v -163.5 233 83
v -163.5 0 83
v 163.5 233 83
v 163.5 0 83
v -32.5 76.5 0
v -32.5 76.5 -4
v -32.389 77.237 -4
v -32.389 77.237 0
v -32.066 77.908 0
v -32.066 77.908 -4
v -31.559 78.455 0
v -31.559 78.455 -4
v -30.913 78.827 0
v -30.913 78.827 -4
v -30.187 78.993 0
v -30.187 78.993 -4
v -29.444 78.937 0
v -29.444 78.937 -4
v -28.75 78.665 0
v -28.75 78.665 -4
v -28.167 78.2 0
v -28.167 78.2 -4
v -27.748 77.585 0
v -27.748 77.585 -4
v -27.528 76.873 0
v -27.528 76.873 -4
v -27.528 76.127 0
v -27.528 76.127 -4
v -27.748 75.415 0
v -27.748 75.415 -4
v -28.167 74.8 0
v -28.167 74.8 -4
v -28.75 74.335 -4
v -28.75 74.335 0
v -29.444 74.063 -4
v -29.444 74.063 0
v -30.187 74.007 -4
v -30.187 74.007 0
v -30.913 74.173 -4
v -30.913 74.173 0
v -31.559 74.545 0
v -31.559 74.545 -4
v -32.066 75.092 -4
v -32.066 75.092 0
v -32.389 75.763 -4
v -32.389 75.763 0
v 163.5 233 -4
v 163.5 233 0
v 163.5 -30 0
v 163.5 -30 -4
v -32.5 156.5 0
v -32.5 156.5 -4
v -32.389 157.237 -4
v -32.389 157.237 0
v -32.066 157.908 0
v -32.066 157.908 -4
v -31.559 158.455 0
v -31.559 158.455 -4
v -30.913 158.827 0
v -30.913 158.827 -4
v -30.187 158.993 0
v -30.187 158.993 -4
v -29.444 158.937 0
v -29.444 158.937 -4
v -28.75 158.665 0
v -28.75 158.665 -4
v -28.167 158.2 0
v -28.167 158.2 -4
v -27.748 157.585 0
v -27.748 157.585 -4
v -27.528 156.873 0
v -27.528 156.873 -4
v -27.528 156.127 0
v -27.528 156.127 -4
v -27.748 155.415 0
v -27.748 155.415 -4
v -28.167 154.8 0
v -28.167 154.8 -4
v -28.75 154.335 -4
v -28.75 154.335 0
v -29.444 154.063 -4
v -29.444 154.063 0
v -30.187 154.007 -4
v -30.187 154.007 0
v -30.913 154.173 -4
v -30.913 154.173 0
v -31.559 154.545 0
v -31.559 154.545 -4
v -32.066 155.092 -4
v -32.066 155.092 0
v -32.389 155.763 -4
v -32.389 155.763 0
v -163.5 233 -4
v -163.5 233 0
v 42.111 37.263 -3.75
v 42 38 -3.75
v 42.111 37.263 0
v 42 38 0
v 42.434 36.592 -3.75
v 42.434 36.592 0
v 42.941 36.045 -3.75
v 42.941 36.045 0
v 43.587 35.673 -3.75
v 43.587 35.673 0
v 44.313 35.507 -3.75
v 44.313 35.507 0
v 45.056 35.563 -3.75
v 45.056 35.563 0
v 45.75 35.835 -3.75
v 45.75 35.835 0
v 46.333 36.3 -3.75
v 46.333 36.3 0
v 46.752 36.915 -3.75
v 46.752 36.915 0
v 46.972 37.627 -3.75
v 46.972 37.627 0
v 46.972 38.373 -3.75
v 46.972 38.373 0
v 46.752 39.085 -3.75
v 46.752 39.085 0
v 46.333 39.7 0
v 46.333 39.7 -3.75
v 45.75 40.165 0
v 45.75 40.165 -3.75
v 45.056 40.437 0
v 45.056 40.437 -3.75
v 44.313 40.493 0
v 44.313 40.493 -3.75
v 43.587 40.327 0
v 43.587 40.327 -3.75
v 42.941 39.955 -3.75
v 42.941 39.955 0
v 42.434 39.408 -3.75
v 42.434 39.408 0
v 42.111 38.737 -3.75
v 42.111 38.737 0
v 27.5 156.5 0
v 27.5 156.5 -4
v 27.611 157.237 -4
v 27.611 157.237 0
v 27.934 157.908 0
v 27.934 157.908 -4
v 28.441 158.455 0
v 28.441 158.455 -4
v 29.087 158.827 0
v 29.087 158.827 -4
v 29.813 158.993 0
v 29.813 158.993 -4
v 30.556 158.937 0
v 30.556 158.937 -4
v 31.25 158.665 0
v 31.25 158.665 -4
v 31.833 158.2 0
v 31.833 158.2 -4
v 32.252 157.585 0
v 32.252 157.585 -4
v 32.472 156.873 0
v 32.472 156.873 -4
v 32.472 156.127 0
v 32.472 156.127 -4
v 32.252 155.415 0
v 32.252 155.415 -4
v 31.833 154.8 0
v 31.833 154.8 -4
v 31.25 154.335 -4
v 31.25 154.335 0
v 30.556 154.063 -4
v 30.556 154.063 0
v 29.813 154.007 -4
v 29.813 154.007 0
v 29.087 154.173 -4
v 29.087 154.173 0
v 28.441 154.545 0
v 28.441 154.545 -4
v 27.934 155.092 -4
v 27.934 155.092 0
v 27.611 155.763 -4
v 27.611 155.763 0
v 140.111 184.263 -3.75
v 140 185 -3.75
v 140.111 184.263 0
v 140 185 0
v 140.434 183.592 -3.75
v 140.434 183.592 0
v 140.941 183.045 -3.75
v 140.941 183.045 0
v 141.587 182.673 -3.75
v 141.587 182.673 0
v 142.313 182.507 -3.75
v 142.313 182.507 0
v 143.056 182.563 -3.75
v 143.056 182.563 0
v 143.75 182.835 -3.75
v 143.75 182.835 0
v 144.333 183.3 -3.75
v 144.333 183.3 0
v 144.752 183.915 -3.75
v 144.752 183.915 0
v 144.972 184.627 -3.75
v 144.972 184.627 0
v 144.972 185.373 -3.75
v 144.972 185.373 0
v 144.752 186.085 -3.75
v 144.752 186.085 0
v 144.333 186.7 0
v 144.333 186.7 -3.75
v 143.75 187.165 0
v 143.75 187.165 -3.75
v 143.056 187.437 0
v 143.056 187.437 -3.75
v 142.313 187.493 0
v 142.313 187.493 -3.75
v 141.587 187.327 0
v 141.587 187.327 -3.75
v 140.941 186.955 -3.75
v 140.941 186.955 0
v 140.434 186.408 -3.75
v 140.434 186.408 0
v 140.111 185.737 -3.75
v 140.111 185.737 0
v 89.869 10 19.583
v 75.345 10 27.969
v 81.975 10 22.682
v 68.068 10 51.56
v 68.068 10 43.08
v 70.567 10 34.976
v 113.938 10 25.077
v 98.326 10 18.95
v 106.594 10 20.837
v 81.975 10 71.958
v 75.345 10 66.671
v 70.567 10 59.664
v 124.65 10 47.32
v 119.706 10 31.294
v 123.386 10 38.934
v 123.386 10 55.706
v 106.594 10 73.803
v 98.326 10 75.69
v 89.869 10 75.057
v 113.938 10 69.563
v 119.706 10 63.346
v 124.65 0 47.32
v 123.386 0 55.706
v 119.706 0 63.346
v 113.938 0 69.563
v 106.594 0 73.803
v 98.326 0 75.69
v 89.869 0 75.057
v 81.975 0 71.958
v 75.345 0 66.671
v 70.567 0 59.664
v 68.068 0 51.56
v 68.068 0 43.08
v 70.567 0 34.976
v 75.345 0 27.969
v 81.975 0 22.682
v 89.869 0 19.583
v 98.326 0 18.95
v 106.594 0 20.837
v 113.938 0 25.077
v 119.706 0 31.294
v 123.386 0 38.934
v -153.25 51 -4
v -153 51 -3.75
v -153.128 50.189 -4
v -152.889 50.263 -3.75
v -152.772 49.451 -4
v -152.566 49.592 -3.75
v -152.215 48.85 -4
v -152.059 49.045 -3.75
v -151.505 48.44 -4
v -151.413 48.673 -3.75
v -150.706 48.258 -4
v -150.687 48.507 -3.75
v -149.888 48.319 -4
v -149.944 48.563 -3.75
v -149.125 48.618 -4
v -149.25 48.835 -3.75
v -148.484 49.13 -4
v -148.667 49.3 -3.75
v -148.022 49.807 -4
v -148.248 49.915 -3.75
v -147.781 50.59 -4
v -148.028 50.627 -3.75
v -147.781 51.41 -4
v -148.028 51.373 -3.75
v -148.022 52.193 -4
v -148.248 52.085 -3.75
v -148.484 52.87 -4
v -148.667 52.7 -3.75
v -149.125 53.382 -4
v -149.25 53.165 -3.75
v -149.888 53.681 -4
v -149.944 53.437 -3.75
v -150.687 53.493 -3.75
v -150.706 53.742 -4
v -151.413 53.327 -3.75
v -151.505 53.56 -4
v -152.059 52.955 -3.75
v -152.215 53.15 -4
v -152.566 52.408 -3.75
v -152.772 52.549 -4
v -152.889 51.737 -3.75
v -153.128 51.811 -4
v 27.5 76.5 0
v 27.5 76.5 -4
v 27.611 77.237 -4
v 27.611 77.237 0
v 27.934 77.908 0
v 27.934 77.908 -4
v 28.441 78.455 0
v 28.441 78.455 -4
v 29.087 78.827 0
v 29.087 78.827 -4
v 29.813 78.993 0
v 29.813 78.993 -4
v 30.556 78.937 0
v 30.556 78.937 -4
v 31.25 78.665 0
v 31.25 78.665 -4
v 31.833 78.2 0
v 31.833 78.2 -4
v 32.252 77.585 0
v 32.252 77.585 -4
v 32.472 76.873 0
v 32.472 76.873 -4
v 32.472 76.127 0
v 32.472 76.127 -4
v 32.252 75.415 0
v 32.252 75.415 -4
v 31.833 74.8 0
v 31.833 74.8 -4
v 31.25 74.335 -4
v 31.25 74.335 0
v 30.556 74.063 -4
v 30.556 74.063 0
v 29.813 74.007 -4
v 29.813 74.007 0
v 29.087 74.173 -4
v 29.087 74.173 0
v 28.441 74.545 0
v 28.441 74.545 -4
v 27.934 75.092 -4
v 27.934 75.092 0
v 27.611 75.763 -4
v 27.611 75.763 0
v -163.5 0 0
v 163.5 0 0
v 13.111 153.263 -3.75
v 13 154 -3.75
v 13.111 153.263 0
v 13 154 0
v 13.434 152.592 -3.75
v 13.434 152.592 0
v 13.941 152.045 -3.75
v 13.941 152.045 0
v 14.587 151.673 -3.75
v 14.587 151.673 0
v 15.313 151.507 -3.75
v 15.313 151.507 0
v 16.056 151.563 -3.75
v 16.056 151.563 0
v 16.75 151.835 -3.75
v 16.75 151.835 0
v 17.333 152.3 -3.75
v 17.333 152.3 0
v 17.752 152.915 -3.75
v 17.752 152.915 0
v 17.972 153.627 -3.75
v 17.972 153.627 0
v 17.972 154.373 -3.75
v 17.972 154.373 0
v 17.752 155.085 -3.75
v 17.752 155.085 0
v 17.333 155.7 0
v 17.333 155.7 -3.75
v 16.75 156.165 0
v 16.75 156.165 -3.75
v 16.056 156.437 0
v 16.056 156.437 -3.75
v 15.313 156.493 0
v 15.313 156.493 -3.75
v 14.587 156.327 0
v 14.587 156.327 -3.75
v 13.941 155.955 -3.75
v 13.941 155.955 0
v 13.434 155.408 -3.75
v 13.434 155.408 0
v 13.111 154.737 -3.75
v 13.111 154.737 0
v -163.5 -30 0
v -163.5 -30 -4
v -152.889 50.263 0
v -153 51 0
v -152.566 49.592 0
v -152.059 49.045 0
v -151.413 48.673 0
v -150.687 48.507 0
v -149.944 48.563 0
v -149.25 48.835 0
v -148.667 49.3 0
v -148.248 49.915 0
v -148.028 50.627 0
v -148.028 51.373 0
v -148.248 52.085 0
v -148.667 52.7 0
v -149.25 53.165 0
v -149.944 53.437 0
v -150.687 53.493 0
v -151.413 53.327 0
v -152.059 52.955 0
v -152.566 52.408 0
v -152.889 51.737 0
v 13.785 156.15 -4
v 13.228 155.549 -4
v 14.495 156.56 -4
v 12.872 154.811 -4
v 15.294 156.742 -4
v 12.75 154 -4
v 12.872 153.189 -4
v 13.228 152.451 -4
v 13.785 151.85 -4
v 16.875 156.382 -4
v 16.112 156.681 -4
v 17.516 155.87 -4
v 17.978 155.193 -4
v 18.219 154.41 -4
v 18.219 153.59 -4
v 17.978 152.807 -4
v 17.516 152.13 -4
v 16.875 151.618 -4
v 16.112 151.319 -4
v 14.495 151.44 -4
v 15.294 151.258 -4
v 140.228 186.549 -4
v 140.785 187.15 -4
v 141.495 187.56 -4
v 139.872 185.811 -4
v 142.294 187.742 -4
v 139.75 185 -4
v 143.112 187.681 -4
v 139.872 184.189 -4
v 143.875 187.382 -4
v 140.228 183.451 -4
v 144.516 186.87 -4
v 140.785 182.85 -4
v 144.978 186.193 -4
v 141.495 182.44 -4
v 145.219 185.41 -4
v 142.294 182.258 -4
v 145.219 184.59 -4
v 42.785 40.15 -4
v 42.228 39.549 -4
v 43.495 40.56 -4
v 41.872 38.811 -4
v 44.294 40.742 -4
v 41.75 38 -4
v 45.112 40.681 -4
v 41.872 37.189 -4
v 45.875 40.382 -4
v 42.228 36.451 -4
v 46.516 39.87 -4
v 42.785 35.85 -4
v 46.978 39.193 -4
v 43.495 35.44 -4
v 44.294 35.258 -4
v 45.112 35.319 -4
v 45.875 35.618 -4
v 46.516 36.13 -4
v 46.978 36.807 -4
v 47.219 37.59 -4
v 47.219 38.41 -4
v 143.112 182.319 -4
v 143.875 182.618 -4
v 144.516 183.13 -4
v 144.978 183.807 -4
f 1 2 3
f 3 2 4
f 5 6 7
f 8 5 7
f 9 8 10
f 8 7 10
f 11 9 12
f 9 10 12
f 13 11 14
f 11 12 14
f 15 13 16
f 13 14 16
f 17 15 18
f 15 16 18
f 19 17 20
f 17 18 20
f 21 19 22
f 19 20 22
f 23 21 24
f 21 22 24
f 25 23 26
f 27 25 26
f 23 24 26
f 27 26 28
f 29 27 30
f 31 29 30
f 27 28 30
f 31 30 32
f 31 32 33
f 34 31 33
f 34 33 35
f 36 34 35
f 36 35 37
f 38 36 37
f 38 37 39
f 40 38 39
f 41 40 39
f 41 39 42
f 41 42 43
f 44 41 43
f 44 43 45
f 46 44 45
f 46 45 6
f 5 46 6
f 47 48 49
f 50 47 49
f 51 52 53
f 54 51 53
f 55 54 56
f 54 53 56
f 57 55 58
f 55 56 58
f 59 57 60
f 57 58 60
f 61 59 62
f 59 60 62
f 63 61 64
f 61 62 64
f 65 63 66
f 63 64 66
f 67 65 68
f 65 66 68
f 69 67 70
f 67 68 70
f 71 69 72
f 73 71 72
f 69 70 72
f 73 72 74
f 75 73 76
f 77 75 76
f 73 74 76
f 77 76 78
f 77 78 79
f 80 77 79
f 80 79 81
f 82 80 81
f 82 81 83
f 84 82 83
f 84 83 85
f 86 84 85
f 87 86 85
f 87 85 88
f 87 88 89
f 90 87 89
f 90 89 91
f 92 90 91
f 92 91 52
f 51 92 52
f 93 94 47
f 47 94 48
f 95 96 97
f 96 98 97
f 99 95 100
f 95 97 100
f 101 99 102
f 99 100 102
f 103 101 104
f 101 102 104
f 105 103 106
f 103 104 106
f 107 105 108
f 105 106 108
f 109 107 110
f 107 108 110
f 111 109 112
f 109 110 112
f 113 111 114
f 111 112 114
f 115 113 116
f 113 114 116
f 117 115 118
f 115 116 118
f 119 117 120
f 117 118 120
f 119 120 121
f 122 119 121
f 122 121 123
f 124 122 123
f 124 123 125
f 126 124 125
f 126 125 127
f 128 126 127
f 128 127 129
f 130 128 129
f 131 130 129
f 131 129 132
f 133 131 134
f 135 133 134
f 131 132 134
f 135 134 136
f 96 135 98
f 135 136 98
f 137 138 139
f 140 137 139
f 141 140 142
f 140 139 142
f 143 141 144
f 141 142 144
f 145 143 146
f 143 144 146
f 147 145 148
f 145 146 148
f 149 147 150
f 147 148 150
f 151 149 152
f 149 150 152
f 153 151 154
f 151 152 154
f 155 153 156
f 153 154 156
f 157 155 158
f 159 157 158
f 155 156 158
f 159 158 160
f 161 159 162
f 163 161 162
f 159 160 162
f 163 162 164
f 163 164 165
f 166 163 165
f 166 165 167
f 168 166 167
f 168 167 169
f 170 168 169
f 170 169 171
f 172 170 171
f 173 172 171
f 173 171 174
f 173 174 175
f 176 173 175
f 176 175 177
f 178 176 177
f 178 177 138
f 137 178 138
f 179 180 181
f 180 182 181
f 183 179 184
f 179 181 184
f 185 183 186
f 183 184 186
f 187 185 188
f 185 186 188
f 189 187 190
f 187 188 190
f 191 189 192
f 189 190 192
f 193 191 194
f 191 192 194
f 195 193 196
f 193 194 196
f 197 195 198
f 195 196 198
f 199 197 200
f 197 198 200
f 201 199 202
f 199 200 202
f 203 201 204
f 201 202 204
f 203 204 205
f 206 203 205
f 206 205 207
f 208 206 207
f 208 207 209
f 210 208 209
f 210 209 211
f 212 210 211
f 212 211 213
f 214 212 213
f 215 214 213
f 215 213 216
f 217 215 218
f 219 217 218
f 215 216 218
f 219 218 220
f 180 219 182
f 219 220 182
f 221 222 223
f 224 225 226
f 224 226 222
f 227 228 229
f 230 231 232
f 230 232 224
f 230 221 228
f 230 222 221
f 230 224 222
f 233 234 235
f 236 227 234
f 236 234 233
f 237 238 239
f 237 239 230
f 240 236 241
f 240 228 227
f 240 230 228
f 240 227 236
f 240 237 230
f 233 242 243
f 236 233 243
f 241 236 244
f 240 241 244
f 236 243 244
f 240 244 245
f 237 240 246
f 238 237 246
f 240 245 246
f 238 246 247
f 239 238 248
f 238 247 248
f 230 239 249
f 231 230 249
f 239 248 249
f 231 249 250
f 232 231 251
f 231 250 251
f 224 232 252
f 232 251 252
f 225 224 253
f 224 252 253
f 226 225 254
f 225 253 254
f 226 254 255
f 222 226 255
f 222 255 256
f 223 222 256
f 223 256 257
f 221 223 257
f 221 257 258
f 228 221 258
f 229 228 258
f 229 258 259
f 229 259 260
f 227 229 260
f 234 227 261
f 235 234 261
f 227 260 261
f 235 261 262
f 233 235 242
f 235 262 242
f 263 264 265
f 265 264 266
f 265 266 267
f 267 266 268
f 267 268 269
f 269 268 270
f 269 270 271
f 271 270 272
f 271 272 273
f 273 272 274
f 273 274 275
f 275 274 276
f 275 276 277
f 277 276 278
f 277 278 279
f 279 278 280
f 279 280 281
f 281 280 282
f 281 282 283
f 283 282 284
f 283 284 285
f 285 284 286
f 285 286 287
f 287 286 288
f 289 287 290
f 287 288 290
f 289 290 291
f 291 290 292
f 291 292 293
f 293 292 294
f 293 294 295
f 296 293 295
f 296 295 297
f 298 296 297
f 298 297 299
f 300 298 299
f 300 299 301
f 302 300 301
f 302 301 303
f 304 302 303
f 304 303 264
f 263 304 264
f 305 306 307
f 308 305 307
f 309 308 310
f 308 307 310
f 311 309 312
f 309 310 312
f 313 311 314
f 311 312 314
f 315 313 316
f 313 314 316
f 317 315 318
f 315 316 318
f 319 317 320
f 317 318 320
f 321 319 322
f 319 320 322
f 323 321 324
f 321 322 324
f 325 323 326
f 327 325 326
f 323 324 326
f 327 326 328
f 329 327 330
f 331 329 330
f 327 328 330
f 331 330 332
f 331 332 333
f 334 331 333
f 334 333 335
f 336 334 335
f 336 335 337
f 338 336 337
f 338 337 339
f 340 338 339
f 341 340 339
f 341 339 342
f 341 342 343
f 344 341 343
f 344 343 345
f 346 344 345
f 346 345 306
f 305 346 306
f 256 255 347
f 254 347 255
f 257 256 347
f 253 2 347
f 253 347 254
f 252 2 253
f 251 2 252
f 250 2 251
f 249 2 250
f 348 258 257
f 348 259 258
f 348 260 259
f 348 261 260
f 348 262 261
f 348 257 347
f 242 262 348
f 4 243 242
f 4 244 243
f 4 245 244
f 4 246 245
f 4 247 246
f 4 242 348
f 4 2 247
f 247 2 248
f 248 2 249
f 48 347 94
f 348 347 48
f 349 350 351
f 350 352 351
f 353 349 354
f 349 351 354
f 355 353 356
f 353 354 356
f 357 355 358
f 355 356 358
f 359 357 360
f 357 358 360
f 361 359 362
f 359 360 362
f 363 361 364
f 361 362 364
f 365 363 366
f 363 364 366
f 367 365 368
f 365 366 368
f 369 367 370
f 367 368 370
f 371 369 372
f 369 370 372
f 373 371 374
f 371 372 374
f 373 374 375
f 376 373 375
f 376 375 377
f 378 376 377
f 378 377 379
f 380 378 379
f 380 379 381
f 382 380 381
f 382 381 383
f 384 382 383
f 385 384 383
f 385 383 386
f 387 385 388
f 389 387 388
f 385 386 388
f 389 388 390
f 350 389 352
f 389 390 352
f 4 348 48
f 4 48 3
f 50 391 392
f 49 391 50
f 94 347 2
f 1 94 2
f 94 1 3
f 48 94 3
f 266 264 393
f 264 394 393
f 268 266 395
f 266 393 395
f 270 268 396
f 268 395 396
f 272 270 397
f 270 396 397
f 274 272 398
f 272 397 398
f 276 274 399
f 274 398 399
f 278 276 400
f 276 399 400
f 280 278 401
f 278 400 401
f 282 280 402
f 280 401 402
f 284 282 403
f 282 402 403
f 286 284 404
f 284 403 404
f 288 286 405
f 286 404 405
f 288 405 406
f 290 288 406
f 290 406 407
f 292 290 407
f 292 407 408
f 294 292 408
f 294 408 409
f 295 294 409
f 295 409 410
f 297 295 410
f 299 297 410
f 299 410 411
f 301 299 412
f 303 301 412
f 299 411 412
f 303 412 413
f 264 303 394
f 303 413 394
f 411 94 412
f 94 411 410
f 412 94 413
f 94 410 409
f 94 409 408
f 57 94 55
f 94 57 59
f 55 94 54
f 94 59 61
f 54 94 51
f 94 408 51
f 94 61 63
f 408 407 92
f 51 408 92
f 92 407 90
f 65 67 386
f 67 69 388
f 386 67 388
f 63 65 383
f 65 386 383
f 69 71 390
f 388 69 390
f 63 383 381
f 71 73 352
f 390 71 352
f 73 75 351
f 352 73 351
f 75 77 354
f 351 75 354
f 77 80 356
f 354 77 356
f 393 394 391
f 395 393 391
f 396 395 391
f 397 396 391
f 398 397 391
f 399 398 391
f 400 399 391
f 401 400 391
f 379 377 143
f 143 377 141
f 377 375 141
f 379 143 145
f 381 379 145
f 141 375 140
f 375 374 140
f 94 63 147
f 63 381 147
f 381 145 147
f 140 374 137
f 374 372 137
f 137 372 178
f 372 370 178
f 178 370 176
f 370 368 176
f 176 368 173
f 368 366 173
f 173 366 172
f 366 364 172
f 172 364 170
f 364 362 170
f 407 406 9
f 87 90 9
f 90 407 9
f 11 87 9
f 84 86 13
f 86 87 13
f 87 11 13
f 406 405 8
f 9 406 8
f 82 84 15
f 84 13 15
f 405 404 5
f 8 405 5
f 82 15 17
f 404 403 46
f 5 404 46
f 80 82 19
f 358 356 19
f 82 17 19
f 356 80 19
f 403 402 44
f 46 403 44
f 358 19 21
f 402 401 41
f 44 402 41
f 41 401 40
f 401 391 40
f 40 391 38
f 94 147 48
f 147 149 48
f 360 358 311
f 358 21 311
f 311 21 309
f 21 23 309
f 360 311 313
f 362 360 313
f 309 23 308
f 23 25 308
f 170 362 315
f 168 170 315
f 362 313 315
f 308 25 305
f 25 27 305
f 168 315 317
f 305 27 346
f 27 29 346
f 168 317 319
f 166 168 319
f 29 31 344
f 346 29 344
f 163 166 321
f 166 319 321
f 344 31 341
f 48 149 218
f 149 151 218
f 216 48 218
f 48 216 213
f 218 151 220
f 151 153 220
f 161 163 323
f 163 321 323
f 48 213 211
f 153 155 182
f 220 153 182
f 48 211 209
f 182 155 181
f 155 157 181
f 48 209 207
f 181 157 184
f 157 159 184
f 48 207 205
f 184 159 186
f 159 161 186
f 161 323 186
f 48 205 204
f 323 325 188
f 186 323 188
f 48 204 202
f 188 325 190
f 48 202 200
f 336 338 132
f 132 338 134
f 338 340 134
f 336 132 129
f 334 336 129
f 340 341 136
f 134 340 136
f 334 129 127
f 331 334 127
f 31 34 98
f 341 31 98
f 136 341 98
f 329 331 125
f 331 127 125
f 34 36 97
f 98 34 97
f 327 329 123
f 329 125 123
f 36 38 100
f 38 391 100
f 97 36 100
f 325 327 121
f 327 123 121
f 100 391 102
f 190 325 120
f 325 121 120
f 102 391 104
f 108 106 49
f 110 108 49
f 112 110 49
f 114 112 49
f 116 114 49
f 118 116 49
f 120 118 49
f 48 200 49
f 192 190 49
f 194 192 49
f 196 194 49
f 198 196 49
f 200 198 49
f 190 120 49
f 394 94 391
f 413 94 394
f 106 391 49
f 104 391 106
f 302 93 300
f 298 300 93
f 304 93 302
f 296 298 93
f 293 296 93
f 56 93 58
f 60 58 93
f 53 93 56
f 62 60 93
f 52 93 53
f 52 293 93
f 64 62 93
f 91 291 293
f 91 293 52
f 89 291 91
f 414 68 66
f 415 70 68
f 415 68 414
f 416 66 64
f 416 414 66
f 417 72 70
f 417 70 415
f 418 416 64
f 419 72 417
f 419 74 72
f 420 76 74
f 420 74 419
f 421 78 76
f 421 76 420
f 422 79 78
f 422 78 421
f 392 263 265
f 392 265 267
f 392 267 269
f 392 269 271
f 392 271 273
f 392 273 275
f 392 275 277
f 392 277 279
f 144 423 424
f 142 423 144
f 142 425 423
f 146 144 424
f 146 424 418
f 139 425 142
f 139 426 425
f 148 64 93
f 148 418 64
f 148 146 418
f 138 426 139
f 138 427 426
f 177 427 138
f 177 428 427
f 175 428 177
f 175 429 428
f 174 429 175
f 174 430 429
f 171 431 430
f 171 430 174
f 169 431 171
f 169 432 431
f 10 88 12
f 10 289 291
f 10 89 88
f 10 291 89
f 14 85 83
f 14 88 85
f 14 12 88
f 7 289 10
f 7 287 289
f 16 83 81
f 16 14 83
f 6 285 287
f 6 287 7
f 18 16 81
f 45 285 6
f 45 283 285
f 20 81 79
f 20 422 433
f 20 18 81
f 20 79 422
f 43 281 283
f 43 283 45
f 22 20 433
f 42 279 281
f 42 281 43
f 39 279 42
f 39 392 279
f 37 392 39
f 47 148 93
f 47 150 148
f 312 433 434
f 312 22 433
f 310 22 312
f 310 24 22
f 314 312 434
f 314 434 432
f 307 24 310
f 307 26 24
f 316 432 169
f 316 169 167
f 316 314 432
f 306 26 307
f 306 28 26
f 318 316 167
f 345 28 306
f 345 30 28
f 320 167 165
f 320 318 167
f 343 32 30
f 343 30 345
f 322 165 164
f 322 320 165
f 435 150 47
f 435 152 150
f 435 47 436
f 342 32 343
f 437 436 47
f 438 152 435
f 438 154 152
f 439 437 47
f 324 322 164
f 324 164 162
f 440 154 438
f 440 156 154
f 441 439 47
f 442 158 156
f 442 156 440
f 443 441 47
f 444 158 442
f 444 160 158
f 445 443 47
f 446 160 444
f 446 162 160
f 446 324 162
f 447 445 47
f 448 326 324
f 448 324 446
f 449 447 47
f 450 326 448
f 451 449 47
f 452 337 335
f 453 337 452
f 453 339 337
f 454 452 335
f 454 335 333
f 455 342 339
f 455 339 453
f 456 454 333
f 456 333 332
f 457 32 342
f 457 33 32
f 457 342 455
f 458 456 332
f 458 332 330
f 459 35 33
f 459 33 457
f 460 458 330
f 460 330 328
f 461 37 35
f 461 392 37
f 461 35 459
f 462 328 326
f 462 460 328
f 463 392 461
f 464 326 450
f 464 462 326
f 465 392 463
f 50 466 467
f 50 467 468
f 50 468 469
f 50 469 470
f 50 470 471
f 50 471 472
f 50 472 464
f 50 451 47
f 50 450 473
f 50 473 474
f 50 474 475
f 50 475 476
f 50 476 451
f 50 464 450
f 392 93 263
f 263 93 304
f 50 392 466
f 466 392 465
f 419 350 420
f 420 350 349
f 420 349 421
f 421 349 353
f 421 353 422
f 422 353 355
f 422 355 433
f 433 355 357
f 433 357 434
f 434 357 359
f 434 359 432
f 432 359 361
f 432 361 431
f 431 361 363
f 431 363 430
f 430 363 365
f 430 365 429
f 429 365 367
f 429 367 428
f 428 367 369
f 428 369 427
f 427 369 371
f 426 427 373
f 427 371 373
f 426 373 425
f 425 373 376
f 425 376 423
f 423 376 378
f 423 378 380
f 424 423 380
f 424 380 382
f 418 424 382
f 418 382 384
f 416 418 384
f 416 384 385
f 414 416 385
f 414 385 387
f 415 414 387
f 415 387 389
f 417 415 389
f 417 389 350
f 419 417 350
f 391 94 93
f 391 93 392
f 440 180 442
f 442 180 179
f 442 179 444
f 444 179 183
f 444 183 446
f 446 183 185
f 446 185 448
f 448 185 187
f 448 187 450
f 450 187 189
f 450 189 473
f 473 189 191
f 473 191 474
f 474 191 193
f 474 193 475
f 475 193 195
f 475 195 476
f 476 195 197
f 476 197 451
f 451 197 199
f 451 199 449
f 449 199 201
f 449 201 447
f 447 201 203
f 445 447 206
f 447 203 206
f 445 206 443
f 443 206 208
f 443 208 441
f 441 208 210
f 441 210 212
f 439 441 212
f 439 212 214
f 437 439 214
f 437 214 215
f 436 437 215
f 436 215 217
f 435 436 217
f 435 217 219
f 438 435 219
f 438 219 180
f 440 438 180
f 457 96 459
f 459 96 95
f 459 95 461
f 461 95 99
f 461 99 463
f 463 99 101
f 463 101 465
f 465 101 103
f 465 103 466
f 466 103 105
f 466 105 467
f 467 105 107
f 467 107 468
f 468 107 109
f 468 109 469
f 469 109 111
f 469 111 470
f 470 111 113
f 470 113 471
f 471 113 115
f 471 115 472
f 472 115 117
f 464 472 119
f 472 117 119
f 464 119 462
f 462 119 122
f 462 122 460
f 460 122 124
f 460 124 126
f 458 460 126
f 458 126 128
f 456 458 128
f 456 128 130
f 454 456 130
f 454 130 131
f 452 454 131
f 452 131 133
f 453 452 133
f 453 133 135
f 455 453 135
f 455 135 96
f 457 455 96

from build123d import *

# Parameters (mm, degrees)
F0_W           = 327
F0_H           = 83
F1_DEPTH       = 233
F2_R           = 28.45
F3_DEPTH       = 10
F4_W           = 327
F4_H           = 263
F5_DEPTH       = 4
F7_D           = 5
F7_CSINK_D     = 5.5
F7_CSINK_ANGLE = 90
F8_D           = 5


with BuildPart() as f1:
    # F0 (on Front) → F1 (new body)
    with BuildSketch(Plane.XZ):
        with Locations((0, 41.5)):
            Rectangle(F0_W, F0_H)
    extrude(amount=-F1_DEPTH)

    # F2 (on face) → F3 (cut)
    with BuildSketch(Plane.XZ):
        with Locations((96.2, 47.32)):
            Circle(F2_R)
    extrude(amount=-F3_DEPTH, mode=Mode.SUBTRACT)


with BuildPart() as f5:
    # F4 (on face) → F5 (new body)
    with BuildSketch(Plane(origin=(0, 0, 0), x_dir=(1, 0, 0), z_dir=(0, 0, -1))):
        with Locations((0, -101.5)):
            Rectangle(F4_W, F4_H)
    extrude(amount=F5_DEPTH)

    # F7 (through all)
    with Locations(Plane(origin=(0, 0, -4), x_dir=(1, 0, 0), z_dir=(0, 0, -1))):
        with Locations((142.5, -185), (44.5, -38), (-150.5, -51), (15.5, -154)):
            CounterSinkHole(F7_D / 2, F7_CSINK_D / 2, counter_sink_angle=F7_CSINK_ANGLE)

    # F8 (through all)
    with Locations(Plane.XY):
        with Locations((-30, 156.5), (30, 156.5), (30, 76.5), (-30, 76.5)):
            Hole(F8_D / 2)


solid = Compound([f1.part, f5.part])
